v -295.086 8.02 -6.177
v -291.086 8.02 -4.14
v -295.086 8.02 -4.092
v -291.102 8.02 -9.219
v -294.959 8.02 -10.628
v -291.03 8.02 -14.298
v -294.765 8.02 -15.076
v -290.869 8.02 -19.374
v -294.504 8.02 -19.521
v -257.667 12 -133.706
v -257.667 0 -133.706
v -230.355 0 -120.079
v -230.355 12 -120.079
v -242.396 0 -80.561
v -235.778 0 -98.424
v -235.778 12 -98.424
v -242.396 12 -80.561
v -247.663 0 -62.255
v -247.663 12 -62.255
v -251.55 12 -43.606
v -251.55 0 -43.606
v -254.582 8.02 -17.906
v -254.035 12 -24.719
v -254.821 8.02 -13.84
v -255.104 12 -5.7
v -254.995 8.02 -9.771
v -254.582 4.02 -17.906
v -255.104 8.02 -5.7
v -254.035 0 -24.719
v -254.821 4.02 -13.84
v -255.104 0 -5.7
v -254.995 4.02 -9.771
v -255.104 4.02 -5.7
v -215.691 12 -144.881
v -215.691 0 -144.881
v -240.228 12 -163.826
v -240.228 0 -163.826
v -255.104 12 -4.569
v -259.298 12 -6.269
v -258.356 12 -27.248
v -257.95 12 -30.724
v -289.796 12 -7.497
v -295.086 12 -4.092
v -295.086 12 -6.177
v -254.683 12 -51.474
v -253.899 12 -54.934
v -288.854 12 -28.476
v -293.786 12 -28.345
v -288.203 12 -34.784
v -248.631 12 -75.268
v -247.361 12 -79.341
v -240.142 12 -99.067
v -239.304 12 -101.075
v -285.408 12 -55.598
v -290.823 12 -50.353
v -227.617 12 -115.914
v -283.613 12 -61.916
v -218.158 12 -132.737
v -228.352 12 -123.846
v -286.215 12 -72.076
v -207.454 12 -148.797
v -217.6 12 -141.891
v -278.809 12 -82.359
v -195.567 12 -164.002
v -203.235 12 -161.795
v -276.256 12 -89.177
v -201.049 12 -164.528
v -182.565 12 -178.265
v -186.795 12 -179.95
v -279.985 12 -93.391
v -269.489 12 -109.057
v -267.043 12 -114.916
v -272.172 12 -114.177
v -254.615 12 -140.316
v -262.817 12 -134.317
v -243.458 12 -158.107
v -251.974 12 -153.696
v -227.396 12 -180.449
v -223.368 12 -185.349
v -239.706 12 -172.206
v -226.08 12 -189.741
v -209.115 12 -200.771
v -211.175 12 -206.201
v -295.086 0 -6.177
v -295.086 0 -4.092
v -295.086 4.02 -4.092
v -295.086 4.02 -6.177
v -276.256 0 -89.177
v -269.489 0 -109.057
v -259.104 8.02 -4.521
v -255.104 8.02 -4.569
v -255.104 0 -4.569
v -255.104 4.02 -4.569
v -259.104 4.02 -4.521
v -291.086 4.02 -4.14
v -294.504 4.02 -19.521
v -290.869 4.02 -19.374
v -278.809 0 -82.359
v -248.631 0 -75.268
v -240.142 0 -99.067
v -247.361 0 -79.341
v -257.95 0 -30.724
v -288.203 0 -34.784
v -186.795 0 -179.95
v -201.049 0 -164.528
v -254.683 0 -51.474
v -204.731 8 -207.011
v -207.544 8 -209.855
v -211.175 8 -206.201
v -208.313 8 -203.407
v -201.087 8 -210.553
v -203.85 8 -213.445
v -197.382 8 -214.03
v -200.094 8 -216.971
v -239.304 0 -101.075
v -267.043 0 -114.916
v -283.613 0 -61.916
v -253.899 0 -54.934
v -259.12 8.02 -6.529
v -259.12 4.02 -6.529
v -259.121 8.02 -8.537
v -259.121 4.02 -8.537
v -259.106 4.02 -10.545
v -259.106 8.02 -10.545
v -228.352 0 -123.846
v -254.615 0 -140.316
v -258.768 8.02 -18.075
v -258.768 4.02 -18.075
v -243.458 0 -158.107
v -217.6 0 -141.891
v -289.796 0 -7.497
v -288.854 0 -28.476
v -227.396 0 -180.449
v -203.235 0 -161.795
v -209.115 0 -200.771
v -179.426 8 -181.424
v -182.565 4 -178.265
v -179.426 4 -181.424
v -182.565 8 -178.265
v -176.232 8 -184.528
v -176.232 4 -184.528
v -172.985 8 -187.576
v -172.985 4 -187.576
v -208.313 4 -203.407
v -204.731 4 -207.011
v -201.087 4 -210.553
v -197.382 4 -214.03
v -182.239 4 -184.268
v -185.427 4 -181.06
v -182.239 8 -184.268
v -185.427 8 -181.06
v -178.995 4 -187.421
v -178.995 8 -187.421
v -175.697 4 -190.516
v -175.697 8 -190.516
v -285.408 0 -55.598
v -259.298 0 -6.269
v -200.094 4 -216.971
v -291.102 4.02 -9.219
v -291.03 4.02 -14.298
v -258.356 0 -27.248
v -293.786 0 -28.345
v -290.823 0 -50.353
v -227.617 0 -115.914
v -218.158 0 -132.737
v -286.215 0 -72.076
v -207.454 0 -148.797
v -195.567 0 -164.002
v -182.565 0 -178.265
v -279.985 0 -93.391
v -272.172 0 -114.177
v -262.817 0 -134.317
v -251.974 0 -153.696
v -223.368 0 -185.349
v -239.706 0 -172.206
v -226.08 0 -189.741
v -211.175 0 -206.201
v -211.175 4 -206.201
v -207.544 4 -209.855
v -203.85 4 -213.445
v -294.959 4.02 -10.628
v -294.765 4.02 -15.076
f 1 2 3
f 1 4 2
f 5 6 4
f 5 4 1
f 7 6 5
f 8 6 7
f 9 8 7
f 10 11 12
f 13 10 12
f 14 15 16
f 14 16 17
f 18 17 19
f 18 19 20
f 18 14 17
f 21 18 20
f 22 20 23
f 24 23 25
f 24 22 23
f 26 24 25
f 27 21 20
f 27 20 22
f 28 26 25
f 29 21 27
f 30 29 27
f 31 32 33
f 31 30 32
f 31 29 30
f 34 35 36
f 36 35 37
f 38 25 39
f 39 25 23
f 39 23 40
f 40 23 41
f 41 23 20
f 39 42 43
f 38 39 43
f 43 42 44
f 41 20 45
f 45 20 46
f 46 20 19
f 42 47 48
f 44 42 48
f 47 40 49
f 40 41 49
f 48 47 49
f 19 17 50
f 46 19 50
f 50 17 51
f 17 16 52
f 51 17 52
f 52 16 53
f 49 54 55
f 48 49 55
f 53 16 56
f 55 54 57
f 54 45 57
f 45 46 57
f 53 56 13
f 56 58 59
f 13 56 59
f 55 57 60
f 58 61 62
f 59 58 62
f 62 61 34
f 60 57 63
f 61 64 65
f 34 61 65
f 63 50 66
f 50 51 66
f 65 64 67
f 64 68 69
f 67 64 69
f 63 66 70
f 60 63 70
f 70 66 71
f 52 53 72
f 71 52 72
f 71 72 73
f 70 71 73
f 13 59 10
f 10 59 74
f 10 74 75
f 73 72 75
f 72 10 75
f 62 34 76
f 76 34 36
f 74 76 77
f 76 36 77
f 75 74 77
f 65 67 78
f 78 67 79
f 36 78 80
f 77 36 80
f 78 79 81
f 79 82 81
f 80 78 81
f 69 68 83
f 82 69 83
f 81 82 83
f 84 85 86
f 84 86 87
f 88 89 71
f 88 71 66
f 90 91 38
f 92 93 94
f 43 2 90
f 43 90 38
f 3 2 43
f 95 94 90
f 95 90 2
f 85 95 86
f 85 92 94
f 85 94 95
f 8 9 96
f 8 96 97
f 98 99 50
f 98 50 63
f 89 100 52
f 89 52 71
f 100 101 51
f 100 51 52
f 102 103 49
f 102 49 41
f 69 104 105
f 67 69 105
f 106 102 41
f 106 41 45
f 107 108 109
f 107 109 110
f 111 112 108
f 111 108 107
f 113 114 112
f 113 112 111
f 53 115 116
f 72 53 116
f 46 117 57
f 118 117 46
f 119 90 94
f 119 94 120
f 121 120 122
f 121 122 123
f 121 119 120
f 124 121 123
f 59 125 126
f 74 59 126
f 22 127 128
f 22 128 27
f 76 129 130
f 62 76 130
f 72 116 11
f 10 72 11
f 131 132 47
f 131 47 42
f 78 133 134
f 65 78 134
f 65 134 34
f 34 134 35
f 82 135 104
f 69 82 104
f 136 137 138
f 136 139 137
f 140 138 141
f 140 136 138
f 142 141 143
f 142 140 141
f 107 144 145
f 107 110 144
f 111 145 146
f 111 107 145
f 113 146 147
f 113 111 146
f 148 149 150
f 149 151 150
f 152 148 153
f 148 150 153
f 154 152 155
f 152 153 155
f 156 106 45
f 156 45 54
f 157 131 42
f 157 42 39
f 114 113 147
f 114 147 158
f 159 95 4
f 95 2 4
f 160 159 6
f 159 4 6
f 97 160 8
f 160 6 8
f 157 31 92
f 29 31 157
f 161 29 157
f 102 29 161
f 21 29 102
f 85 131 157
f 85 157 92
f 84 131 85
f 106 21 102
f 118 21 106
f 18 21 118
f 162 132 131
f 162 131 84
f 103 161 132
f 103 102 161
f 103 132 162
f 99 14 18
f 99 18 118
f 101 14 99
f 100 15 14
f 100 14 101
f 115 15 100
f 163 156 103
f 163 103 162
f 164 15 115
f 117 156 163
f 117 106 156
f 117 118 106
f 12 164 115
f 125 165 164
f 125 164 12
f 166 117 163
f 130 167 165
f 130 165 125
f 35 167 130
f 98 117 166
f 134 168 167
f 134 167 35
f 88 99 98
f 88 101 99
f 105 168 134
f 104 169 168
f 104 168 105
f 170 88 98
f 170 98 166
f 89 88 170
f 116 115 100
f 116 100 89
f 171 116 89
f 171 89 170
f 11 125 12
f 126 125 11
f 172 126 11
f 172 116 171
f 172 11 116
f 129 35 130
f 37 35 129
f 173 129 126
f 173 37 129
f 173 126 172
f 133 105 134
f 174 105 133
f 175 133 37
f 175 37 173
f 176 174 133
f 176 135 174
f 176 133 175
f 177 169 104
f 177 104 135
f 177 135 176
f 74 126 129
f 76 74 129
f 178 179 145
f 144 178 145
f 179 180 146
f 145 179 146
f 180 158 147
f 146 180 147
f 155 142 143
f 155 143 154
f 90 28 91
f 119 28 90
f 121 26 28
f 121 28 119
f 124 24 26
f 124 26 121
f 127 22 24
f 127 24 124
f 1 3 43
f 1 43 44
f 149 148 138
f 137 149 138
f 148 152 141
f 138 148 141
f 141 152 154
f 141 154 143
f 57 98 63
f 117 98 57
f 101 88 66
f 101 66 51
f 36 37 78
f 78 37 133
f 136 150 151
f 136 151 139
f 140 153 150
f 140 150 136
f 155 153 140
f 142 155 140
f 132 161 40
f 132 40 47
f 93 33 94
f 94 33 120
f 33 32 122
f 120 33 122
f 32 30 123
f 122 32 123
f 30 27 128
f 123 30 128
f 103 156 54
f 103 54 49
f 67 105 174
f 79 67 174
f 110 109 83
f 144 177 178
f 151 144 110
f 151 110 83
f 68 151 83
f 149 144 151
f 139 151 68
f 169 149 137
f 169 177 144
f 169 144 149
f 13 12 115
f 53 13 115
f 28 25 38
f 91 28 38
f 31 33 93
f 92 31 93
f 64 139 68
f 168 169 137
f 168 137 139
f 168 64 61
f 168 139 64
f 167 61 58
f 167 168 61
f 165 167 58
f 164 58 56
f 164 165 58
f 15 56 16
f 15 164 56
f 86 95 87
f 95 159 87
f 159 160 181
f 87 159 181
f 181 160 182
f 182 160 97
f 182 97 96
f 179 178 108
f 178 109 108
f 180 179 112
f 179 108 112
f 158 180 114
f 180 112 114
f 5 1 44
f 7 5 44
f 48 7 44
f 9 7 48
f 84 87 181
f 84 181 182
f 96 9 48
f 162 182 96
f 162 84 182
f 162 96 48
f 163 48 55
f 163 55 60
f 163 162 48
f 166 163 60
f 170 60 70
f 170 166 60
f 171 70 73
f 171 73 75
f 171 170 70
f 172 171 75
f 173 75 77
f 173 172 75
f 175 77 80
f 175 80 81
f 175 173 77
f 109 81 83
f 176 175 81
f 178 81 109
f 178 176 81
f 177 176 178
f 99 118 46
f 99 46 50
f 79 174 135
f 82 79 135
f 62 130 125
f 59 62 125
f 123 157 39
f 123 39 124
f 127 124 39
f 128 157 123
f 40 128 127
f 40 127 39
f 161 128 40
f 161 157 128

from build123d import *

# Parameters (mm, degrees)
BOSS_EXTRUDE1_DEPTH = 12
SKETCH3_W           = 4.4
SKETCH3_H           = 4
CUT_REVOLVE1_ANGLE  = 3
SKETCH4_W           = 4
SKETCH4_H           = 4
REVOLVE1_ANGLE      = 3


with BuildPart() as part:
    # Sketch1 → Boss-Extrude1 (new body)
    with BuildSketch(Plane(origin=(0, 0, 0), x_dir=(1, 0, 0), z_dir=(0, 1, 0))):
        with BuildLine():
            Line((-211.174799688, 206.201137862), (-182.564973394, 178.265140079))
            ThreePointArc((-182.564973394, 178.265140079), (-212.957593109, 140.868101899), (-235.777573605, 98.424041209))
            ThreePointArc((-235.777573605, 98.424041209), (-249.780718251, 52.966609881), (-255.104275502, 5.700069272))
            Line((-255.104275502, 5.700069272), (-255.104275502, 4.568862205))
            Line((-255.104275502, 4.568862205), (-295.085665641, 4.092423829))
            Line((-295.085665641, 4.092423829), (-295.085665641, 6.176990522))
            ThreePointArc((-295.085665641, 6.176990522), (-272.171507635, 114.17694912), (-211.174799688, 206.201137862))
        make_face()
        Polygon((-288.853949055, 28.475508763), (-289.795828236, 7.496641691), (-259.297708464, 6.269015395), (-258.355829283, 27.247882467), align=None, mode=Mode.SUBTRACT)
        Polygon((-288.202969042, 34.784391797), (-257.949644018, 30.724233072), (-254.683431263, 51.47416217), (-285.407974911, 55.597560966), align=None, mode=Mode.SUBTRACT)
        Polygon((-283.612878523, 61.915838046), (-253.89939669, 54.933619681), (-248.631031599, 75.267631401), (-278.809043274, 82.359007245), align=None, mode=Mode.SUBTRACT)
        Polygon((-276.255921554, 89.176800074), (-247.361344598, 79.340855863), (-240.142390382, 99.066838813), (-269.488694715, 109.056554622), align=None, mode=Mode.SUBTRACT)
        Polygon((-230.355302506, 120.079310533), (-239.303938624, 101.075373705), (-267.042878446, 114.91557665), (-257.667257096, 133.706471368), align=None, mode=Mode.SUBTRACT)
        Polygon((-217.599523923, 141.890991255), (-228.352118631, 123.846340791), (-254.61522008, 140.315994772), (-243.458357706, 158.107128012), align=None, mode=Mode.SUBTRACT)
        Polygon((-203.234989184, 161.794735755), (-215.691212171, 144.88112549), (-240.228428406, 163.826442046), (-227.39588109, 180.449490275), align=None, mode=Mode.SUBTRACT)
        Polygon((-186.795494279, 179.950119438), (-201.048962764, 164.528101536), (-223.368087677, 185.348741273), (-209.114619192, 200.770759174), align=None, mode=Mode.SUBTRACT)
    extrude(amount=BOSS_EXTRUDE1_DEPTH)

    # Sketch3 → Cut-Revolve1 (revolve, cut)
    with BuildSketch(Plane(origin=(-0.090657576, 0, -7.607732879), x_dir=(0.9999290060329473, 0, -0.01191565751279397), z_dir=(0.01191565751279397, 0, 0.9999290060329473))):
        with Locations((-256.83172364, 6.020050252)):
            Rectangle(SKETCH3_W, SKETCH3_H)
        with Locations((-293.215952418, 6.020050252)):
            Rectangle(SKETCH3_W, SKETCH3_H)
    revolve(axis=Axis((-0.090657576, 0, -7.607732879), (0, -1, 0)), revolution_arc=CUT_REVOLVE1_ANGLE, mode=Mode.SUBTRACT)

    # Sketch4 → Revolve1 (revolve)
    with BuildSketch(Plane(origin=(0, 0, 0), x_dir=(-0.715482223100618, 0, -0.6986309386414242), z_dir=(0.6986309386414242, 0, -0.715482223100618))):
        with Locations((257.163535165, 6)):
            Rectangle(SKETCH4_W, SKETCH4_H)
        with Locations((293.150309637, 6)):
            Rectangle(SKETCH4_W, SKETCH4_H)
    revolve(axis=Axis((0, 0, 0), (0, -1, 0)), revolution_arc=REVOLVE1_ANGLE)


solid = part.part
